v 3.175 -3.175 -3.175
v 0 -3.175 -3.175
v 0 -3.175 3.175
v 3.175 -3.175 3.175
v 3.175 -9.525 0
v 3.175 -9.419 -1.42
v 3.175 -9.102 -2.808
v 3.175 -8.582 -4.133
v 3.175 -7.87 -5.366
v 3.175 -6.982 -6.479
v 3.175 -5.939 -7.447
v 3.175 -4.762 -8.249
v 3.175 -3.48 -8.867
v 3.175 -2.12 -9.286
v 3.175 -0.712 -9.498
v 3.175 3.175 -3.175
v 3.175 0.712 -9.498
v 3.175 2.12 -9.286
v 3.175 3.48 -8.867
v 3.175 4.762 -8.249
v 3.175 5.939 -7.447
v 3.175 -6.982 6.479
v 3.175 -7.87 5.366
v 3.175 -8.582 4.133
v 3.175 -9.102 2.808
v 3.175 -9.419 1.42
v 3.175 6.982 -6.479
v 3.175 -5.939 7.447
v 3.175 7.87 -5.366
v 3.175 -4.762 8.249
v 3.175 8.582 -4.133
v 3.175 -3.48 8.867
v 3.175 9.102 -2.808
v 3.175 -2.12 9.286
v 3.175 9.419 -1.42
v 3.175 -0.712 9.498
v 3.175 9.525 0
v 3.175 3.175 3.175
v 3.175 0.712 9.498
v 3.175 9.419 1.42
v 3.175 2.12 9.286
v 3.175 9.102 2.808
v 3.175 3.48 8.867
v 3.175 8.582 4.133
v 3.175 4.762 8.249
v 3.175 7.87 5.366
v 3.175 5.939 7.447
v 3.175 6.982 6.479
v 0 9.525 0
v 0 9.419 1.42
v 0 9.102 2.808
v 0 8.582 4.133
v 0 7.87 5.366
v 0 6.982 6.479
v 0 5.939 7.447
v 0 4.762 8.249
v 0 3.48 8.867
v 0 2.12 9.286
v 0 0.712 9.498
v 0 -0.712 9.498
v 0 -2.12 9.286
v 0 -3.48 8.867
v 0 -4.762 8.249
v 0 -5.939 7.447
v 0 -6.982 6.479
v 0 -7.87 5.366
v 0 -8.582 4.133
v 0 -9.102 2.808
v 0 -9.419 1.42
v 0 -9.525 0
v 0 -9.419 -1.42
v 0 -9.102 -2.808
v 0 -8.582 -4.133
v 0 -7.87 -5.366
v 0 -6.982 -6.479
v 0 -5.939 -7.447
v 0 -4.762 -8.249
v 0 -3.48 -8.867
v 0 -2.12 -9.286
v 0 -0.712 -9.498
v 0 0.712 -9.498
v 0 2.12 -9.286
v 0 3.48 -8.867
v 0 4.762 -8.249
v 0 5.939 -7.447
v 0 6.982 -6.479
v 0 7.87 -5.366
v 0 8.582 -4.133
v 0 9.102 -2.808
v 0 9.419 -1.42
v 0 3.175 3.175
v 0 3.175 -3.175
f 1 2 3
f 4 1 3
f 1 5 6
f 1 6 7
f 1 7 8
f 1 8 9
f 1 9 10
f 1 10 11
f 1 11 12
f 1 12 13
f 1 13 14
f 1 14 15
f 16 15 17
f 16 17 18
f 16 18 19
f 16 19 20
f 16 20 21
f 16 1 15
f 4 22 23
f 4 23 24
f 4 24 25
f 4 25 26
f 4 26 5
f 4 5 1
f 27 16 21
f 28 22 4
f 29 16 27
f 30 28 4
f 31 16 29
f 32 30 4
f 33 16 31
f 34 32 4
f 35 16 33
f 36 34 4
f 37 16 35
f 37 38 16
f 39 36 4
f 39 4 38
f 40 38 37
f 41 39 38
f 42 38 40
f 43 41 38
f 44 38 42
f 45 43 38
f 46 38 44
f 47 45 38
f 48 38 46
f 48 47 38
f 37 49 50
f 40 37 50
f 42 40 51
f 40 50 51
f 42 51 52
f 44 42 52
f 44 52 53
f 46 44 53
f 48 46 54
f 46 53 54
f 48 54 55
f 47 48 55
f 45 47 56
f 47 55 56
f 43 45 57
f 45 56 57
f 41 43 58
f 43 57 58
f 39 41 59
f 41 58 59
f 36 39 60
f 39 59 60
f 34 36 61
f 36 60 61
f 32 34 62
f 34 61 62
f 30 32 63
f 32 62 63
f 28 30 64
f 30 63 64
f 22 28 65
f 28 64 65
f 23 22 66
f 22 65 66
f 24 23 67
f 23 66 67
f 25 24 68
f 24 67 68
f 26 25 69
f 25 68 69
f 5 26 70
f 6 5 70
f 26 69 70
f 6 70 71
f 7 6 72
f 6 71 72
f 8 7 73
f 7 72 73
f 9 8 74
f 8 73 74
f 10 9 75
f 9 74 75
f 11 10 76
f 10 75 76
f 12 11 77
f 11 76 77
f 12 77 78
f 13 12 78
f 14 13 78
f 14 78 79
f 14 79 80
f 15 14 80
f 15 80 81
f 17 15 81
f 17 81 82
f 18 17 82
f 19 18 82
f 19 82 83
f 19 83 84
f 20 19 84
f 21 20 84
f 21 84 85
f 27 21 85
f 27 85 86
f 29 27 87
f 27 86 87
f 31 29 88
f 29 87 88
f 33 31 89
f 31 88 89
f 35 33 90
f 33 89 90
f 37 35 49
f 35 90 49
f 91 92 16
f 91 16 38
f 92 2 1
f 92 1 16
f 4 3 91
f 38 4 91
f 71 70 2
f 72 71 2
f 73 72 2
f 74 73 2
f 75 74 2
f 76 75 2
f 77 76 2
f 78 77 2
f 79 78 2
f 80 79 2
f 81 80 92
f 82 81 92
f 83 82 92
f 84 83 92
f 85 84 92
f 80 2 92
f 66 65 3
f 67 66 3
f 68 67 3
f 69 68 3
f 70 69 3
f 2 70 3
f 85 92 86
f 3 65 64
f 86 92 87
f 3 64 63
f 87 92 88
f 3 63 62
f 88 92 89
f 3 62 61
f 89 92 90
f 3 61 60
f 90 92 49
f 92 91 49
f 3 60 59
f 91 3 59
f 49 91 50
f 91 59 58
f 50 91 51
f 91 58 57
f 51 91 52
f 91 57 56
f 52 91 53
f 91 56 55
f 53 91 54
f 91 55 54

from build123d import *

# Parameters (mm, degrees)
F0_R     = 9.525
F0_W     = 6.35
F0_H     = 6.35
F1_DEPTH = 3.175


with BuildPart() as f1:
    # F0 (on Right) → F1 (new body)
    with BuildSketch(Plane.YZ):
        Circle(F0_R)
        Rectangle(F0_W, F0_H, mode=Mode.SUBTRACT)
    extrude(amount=F1_DEPTH)


solid = f1.part
